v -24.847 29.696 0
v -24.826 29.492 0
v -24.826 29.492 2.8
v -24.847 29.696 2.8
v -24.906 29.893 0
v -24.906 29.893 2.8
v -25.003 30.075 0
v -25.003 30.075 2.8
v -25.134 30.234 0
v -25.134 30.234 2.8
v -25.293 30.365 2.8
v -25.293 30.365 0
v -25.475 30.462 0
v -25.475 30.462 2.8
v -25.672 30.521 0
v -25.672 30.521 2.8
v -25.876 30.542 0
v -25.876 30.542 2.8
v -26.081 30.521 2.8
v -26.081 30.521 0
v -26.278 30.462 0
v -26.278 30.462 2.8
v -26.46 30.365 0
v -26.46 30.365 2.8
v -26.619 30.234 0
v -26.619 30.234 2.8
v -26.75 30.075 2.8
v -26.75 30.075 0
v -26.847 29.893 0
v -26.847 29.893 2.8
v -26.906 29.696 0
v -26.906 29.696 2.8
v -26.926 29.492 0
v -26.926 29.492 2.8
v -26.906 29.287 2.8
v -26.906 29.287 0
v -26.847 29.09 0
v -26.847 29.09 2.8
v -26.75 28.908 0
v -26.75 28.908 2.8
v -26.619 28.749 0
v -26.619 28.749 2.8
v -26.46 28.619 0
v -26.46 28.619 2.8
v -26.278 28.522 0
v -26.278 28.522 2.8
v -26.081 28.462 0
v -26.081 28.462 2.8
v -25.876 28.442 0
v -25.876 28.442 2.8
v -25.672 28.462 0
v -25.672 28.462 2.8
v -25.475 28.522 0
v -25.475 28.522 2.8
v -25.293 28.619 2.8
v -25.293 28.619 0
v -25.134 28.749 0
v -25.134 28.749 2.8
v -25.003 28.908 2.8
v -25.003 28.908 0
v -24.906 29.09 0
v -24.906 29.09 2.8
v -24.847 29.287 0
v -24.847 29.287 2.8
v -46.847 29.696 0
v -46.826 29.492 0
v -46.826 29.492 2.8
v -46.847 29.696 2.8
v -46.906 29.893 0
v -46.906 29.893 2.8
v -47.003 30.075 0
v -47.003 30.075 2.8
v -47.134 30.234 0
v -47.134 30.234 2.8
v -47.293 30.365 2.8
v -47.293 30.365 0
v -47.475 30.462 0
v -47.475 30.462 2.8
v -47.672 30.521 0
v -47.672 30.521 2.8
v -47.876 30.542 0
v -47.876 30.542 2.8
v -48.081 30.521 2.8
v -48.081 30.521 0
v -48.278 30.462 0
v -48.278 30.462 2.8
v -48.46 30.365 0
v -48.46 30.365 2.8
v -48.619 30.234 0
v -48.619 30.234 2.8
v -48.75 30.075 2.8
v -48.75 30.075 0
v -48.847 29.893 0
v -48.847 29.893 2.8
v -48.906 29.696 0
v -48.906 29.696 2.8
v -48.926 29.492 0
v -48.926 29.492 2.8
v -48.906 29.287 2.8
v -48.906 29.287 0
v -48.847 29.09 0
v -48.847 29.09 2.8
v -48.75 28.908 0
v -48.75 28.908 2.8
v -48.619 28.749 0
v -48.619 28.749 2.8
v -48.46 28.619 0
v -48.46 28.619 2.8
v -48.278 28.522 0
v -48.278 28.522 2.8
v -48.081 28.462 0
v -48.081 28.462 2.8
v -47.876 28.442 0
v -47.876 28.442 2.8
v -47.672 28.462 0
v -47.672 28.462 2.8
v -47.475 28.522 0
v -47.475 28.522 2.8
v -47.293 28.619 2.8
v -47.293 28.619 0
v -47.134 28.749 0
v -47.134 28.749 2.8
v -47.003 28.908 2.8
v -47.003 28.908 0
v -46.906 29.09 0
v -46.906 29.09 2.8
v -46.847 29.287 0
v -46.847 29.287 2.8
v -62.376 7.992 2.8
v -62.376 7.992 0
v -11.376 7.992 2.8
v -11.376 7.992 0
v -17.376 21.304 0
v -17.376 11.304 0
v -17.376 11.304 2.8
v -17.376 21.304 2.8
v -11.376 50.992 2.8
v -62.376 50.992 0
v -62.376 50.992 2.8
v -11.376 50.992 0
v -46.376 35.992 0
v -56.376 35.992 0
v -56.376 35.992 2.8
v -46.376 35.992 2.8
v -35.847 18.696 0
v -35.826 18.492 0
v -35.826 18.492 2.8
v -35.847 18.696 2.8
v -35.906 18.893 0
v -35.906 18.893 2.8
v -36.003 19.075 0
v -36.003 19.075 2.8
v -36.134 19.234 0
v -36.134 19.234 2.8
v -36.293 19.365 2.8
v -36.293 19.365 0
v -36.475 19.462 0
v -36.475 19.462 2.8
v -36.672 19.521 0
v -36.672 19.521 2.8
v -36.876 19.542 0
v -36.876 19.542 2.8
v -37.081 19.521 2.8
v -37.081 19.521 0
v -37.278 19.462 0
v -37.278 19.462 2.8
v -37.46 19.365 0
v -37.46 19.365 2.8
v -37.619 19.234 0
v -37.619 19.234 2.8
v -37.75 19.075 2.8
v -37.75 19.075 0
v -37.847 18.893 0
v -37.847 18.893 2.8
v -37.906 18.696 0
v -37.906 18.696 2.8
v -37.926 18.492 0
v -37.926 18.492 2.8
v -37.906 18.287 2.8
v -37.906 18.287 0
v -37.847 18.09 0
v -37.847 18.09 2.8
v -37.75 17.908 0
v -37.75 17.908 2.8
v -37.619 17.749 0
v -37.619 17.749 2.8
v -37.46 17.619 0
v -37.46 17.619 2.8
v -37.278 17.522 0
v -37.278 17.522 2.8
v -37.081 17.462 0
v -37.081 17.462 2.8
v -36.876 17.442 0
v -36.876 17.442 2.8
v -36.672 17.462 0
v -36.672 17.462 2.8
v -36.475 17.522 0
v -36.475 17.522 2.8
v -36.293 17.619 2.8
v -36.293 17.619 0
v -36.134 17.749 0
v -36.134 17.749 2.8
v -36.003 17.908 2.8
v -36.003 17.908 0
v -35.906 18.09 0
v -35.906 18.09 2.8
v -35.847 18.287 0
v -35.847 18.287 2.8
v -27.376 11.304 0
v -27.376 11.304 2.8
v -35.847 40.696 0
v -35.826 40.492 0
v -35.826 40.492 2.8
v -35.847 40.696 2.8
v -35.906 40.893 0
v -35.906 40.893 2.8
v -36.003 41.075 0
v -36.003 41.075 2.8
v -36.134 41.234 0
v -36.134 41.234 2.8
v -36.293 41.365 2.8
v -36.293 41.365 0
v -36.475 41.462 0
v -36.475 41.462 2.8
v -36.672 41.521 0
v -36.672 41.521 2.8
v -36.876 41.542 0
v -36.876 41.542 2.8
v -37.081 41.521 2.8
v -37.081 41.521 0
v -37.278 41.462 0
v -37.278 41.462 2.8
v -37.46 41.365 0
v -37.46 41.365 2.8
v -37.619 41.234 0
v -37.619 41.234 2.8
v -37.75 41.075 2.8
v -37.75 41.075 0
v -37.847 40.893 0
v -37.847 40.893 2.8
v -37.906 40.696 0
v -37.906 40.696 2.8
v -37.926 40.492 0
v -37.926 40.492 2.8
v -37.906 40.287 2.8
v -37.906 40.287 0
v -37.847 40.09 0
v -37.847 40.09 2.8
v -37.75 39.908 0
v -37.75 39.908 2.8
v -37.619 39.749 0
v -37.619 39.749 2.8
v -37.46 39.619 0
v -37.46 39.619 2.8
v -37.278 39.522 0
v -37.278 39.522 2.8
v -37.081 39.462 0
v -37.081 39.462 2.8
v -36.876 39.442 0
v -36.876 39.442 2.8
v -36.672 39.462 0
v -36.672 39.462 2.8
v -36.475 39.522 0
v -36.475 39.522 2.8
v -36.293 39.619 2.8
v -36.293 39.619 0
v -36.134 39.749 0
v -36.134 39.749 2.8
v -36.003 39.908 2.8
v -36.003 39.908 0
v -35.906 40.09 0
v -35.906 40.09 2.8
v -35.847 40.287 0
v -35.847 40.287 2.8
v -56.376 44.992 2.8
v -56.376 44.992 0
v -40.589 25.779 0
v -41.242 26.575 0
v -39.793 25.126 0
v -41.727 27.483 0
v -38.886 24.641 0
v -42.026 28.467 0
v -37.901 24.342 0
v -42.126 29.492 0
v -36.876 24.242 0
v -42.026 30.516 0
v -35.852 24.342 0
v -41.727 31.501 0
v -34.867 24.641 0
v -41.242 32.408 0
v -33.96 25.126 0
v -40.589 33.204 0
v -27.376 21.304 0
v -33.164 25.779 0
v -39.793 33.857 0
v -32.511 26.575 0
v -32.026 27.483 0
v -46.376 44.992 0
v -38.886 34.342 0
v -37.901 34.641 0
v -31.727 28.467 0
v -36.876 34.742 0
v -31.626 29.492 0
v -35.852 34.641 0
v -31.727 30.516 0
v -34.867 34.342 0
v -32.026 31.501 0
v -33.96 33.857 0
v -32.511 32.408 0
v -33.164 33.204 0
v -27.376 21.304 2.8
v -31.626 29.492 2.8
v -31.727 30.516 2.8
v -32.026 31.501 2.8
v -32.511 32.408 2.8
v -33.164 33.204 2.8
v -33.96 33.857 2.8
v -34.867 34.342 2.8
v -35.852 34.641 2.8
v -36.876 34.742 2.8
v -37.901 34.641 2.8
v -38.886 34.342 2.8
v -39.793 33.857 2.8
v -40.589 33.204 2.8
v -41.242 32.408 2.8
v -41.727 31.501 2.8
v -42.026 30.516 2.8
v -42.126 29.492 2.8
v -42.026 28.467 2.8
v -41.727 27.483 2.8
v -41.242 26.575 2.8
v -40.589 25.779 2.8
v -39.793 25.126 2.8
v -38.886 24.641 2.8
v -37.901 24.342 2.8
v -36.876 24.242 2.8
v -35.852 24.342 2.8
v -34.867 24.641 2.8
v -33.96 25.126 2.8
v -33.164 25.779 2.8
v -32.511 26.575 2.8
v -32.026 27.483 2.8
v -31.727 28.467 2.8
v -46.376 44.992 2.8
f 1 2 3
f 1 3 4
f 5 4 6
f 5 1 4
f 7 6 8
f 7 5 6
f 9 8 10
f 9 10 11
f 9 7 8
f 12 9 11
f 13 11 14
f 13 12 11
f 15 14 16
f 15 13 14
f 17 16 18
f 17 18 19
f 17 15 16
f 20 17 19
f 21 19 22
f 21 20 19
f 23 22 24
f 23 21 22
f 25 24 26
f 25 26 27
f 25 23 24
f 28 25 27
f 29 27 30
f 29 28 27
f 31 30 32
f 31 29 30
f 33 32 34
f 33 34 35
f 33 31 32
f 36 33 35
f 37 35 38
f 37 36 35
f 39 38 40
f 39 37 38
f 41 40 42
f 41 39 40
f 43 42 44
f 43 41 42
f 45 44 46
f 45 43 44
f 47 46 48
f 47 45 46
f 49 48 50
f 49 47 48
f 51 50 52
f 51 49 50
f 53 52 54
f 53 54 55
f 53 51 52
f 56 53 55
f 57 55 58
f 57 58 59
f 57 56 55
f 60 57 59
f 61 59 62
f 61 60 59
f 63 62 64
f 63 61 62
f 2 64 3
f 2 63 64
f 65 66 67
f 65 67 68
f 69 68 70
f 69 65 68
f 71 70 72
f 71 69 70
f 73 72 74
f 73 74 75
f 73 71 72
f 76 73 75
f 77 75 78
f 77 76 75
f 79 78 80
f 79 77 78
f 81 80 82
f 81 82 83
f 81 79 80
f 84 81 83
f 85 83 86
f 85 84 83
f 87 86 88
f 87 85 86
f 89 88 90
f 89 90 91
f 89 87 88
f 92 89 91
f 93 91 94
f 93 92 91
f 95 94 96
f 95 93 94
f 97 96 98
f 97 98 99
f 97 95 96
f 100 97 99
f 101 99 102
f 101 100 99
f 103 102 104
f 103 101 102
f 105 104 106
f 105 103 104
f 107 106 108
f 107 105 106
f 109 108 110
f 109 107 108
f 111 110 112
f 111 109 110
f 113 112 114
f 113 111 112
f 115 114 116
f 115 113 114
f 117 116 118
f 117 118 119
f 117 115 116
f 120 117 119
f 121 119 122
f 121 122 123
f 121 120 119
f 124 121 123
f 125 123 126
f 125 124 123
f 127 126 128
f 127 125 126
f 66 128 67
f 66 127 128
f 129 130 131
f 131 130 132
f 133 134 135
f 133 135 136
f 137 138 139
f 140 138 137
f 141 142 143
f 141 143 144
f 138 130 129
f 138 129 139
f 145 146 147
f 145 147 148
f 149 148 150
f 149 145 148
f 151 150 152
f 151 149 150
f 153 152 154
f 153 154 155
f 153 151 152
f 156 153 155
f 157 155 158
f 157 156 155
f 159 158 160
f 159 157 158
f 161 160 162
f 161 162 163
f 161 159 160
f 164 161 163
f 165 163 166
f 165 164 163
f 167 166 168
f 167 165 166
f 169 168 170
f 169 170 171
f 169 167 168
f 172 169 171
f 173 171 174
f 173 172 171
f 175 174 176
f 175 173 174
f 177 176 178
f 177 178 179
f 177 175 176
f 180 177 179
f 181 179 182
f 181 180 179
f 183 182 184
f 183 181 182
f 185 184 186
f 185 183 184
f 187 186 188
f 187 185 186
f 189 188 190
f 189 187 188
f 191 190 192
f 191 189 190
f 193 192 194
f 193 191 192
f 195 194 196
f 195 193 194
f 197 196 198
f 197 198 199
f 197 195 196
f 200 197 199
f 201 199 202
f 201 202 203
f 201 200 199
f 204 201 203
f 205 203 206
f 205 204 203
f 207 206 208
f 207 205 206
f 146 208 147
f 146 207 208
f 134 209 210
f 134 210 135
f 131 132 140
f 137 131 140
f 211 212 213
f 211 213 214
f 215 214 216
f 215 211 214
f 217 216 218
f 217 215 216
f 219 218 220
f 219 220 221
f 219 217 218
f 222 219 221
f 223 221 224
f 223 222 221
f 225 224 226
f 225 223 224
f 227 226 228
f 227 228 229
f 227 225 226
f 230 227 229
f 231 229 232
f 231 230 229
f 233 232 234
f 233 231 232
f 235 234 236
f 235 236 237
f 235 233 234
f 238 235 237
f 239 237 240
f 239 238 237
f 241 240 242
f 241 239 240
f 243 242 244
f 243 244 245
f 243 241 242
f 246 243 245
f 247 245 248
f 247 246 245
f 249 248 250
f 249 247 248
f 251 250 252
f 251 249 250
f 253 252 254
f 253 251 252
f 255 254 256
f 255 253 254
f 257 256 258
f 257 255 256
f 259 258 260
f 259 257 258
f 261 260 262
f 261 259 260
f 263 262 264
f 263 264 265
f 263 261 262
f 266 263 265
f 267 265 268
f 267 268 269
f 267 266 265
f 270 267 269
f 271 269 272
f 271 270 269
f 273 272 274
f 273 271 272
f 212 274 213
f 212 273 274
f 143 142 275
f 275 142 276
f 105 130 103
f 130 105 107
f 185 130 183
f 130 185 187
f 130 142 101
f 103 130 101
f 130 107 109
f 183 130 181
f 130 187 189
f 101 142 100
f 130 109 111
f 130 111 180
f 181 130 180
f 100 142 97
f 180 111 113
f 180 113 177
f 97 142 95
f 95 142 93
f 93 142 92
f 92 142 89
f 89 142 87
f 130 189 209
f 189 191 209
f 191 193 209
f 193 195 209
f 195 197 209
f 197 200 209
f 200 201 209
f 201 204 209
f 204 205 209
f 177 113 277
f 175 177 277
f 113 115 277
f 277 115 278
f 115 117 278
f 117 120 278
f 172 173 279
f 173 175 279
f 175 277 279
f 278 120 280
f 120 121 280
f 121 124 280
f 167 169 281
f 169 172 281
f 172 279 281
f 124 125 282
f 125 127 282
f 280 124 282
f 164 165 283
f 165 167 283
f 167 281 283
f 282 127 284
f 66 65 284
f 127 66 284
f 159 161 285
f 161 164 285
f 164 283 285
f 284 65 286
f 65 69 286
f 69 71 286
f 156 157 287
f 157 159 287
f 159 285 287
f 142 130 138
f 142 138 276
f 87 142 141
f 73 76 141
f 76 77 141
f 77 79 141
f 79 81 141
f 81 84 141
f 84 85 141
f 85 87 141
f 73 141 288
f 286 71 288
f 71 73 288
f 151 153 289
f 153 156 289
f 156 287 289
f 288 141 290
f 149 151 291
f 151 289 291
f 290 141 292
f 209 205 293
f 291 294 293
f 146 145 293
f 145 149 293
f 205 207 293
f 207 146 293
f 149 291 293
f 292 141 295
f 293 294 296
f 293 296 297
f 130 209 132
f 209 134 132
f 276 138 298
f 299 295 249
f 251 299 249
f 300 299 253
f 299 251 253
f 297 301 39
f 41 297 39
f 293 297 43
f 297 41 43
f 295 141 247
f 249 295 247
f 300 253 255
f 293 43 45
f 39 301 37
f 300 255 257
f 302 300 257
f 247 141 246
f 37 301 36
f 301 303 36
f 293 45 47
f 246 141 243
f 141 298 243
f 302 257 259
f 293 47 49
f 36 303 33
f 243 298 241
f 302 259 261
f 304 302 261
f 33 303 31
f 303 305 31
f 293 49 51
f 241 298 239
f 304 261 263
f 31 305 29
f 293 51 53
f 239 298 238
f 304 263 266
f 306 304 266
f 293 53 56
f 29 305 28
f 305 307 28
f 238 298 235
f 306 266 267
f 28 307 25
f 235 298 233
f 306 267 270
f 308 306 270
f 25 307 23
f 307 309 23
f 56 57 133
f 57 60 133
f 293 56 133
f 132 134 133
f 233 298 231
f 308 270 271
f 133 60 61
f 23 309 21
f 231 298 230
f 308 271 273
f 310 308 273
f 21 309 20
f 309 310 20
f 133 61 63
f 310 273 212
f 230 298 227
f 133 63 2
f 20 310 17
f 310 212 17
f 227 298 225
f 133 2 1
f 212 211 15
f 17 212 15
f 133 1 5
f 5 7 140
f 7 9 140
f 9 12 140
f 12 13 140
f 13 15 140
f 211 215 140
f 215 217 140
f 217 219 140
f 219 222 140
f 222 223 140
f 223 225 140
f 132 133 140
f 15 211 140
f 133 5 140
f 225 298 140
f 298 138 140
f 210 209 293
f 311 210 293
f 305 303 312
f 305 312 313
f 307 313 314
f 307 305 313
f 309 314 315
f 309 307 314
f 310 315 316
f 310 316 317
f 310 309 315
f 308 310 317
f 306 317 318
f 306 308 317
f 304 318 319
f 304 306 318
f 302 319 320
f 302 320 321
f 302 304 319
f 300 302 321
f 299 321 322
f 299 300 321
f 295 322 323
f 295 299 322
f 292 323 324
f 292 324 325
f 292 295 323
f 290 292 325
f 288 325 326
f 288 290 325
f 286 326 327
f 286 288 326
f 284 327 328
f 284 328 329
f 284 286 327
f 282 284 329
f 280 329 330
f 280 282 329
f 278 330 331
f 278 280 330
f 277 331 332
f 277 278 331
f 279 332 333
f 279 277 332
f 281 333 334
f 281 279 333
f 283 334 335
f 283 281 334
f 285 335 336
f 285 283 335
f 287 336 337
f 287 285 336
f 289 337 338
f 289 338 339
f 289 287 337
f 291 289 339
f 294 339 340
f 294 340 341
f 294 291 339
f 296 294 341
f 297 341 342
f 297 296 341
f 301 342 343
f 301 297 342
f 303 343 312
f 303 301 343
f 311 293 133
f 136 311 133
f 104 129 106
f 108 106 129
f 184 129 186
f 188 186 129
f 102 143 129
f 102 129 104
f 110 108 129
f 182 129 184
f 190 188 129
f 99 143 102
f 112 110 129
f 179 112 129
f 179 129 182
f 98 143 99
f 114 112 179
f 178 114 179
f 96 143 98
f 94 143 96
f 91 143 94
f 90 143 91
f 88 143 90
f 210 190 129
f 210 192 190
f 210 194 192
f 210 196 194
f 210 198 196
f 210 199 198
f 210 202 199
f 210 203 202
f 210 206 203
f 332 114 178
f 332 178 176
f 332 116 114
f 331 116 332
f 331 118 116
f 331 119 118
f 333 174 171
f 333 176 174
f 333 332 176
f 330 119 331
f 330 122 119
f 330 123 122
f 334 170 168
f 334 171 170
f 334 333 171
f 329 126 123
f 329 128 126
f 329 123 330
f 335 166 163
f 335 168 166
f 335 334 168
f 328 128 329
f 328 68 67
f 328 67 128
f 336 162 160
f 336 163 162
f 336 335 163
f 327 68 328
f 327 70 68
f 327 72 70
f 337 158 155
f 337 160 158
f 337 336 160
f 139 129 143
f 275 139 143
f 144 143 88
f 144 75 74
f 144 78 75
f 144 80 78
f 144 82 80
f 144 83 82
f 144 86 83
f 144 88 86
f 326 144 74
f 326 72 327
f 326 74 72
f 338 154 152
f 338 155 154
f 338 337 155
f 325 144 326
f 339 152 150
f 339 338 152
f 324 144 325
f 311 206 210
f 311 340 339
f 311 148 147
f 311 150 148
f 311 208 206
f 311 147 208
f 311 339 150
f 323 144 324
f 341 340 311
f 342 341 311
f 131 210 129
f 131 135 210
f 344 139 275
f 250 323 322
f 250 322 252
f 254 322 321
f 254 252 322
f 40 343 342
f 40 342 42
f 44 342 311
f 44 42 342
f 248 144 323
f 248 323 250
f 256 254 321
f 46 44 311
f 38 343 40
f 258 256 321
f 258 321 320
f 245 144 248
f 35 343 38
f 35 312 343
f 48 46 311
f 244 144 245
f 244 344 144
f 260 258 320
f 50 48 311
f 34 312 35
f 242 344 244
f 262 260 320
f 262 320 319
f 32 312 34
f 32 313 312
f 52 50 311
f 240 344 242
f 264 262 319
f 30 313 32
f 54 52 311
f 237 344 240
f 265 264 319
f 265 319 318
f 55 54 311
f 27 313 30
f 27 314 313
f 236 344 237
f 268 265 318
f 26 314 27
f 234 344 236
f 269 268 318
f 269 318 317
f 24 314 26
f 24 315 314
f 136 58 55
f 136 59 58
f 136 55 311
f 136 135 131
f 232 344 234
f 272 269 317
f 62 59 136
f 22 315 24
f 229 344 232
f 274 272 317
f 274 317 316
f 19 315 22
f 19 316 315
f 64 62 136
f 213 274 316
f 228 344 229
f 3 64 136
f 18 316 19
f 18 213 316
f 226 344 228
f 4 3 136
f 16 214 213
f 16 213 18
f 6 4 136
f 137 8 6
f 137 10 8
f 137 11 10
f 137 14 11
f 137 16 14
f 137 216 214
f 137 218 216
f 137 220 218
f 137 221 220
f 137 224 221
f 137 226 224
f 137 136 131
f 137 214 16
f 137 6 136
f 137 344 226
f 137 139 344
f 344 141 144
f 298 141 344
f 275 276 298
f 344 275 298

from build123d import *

# Parameters (mm, degrees)
F0_W     = 51
F0_H     = 43
F0_R     = 1.05
F0_W_2   = 10
F0_H_2   = 10
F0_R_2   = 5.25
F0_H_3   = 9
F1_DEPTH = 2.8


with BuildPart() as f1:
    # F0 (on Top) → F1 (new body)
    with BuildSketch(Plane.XY):
        with Locations((-36.876488, 29.491607)):
            Rectangle(F0_W, F0_H)
        with Locations((-47.876488, 29.491607)):
            Circle(F0_R, mode=Mode.SUBTRACT)
        with Locations((-36.876488, 18.491607)):
            Circle(F0_R, mode=Mode.SUBTRACT)
        with Locations((-22.376488, 16.304032)):
            Rectangle(F0_W_2, F0_H_2, mode=Mode.SUBTRACT)
        with Locations((-36.876488, 29.491607)):
            Circle(F0_R_2, mode=Mode.SUBTRACT)
        with Locations((-25.876488, 29.491607)):
            Circle(F0_R, mode=Mode.SUBTRACT)
        with Locations((-51.376488, 40.491607)):
            Rectangle(F0_W_2, F0_H_3, mode=Mode.SUBTRACT)
        with Locations((-36.876488, 40.491607)):
            Circle(F0_R, mode=Mode.SUBTRACT)
    extrude(amount=F1_DEPTH)


solid = f1.part
